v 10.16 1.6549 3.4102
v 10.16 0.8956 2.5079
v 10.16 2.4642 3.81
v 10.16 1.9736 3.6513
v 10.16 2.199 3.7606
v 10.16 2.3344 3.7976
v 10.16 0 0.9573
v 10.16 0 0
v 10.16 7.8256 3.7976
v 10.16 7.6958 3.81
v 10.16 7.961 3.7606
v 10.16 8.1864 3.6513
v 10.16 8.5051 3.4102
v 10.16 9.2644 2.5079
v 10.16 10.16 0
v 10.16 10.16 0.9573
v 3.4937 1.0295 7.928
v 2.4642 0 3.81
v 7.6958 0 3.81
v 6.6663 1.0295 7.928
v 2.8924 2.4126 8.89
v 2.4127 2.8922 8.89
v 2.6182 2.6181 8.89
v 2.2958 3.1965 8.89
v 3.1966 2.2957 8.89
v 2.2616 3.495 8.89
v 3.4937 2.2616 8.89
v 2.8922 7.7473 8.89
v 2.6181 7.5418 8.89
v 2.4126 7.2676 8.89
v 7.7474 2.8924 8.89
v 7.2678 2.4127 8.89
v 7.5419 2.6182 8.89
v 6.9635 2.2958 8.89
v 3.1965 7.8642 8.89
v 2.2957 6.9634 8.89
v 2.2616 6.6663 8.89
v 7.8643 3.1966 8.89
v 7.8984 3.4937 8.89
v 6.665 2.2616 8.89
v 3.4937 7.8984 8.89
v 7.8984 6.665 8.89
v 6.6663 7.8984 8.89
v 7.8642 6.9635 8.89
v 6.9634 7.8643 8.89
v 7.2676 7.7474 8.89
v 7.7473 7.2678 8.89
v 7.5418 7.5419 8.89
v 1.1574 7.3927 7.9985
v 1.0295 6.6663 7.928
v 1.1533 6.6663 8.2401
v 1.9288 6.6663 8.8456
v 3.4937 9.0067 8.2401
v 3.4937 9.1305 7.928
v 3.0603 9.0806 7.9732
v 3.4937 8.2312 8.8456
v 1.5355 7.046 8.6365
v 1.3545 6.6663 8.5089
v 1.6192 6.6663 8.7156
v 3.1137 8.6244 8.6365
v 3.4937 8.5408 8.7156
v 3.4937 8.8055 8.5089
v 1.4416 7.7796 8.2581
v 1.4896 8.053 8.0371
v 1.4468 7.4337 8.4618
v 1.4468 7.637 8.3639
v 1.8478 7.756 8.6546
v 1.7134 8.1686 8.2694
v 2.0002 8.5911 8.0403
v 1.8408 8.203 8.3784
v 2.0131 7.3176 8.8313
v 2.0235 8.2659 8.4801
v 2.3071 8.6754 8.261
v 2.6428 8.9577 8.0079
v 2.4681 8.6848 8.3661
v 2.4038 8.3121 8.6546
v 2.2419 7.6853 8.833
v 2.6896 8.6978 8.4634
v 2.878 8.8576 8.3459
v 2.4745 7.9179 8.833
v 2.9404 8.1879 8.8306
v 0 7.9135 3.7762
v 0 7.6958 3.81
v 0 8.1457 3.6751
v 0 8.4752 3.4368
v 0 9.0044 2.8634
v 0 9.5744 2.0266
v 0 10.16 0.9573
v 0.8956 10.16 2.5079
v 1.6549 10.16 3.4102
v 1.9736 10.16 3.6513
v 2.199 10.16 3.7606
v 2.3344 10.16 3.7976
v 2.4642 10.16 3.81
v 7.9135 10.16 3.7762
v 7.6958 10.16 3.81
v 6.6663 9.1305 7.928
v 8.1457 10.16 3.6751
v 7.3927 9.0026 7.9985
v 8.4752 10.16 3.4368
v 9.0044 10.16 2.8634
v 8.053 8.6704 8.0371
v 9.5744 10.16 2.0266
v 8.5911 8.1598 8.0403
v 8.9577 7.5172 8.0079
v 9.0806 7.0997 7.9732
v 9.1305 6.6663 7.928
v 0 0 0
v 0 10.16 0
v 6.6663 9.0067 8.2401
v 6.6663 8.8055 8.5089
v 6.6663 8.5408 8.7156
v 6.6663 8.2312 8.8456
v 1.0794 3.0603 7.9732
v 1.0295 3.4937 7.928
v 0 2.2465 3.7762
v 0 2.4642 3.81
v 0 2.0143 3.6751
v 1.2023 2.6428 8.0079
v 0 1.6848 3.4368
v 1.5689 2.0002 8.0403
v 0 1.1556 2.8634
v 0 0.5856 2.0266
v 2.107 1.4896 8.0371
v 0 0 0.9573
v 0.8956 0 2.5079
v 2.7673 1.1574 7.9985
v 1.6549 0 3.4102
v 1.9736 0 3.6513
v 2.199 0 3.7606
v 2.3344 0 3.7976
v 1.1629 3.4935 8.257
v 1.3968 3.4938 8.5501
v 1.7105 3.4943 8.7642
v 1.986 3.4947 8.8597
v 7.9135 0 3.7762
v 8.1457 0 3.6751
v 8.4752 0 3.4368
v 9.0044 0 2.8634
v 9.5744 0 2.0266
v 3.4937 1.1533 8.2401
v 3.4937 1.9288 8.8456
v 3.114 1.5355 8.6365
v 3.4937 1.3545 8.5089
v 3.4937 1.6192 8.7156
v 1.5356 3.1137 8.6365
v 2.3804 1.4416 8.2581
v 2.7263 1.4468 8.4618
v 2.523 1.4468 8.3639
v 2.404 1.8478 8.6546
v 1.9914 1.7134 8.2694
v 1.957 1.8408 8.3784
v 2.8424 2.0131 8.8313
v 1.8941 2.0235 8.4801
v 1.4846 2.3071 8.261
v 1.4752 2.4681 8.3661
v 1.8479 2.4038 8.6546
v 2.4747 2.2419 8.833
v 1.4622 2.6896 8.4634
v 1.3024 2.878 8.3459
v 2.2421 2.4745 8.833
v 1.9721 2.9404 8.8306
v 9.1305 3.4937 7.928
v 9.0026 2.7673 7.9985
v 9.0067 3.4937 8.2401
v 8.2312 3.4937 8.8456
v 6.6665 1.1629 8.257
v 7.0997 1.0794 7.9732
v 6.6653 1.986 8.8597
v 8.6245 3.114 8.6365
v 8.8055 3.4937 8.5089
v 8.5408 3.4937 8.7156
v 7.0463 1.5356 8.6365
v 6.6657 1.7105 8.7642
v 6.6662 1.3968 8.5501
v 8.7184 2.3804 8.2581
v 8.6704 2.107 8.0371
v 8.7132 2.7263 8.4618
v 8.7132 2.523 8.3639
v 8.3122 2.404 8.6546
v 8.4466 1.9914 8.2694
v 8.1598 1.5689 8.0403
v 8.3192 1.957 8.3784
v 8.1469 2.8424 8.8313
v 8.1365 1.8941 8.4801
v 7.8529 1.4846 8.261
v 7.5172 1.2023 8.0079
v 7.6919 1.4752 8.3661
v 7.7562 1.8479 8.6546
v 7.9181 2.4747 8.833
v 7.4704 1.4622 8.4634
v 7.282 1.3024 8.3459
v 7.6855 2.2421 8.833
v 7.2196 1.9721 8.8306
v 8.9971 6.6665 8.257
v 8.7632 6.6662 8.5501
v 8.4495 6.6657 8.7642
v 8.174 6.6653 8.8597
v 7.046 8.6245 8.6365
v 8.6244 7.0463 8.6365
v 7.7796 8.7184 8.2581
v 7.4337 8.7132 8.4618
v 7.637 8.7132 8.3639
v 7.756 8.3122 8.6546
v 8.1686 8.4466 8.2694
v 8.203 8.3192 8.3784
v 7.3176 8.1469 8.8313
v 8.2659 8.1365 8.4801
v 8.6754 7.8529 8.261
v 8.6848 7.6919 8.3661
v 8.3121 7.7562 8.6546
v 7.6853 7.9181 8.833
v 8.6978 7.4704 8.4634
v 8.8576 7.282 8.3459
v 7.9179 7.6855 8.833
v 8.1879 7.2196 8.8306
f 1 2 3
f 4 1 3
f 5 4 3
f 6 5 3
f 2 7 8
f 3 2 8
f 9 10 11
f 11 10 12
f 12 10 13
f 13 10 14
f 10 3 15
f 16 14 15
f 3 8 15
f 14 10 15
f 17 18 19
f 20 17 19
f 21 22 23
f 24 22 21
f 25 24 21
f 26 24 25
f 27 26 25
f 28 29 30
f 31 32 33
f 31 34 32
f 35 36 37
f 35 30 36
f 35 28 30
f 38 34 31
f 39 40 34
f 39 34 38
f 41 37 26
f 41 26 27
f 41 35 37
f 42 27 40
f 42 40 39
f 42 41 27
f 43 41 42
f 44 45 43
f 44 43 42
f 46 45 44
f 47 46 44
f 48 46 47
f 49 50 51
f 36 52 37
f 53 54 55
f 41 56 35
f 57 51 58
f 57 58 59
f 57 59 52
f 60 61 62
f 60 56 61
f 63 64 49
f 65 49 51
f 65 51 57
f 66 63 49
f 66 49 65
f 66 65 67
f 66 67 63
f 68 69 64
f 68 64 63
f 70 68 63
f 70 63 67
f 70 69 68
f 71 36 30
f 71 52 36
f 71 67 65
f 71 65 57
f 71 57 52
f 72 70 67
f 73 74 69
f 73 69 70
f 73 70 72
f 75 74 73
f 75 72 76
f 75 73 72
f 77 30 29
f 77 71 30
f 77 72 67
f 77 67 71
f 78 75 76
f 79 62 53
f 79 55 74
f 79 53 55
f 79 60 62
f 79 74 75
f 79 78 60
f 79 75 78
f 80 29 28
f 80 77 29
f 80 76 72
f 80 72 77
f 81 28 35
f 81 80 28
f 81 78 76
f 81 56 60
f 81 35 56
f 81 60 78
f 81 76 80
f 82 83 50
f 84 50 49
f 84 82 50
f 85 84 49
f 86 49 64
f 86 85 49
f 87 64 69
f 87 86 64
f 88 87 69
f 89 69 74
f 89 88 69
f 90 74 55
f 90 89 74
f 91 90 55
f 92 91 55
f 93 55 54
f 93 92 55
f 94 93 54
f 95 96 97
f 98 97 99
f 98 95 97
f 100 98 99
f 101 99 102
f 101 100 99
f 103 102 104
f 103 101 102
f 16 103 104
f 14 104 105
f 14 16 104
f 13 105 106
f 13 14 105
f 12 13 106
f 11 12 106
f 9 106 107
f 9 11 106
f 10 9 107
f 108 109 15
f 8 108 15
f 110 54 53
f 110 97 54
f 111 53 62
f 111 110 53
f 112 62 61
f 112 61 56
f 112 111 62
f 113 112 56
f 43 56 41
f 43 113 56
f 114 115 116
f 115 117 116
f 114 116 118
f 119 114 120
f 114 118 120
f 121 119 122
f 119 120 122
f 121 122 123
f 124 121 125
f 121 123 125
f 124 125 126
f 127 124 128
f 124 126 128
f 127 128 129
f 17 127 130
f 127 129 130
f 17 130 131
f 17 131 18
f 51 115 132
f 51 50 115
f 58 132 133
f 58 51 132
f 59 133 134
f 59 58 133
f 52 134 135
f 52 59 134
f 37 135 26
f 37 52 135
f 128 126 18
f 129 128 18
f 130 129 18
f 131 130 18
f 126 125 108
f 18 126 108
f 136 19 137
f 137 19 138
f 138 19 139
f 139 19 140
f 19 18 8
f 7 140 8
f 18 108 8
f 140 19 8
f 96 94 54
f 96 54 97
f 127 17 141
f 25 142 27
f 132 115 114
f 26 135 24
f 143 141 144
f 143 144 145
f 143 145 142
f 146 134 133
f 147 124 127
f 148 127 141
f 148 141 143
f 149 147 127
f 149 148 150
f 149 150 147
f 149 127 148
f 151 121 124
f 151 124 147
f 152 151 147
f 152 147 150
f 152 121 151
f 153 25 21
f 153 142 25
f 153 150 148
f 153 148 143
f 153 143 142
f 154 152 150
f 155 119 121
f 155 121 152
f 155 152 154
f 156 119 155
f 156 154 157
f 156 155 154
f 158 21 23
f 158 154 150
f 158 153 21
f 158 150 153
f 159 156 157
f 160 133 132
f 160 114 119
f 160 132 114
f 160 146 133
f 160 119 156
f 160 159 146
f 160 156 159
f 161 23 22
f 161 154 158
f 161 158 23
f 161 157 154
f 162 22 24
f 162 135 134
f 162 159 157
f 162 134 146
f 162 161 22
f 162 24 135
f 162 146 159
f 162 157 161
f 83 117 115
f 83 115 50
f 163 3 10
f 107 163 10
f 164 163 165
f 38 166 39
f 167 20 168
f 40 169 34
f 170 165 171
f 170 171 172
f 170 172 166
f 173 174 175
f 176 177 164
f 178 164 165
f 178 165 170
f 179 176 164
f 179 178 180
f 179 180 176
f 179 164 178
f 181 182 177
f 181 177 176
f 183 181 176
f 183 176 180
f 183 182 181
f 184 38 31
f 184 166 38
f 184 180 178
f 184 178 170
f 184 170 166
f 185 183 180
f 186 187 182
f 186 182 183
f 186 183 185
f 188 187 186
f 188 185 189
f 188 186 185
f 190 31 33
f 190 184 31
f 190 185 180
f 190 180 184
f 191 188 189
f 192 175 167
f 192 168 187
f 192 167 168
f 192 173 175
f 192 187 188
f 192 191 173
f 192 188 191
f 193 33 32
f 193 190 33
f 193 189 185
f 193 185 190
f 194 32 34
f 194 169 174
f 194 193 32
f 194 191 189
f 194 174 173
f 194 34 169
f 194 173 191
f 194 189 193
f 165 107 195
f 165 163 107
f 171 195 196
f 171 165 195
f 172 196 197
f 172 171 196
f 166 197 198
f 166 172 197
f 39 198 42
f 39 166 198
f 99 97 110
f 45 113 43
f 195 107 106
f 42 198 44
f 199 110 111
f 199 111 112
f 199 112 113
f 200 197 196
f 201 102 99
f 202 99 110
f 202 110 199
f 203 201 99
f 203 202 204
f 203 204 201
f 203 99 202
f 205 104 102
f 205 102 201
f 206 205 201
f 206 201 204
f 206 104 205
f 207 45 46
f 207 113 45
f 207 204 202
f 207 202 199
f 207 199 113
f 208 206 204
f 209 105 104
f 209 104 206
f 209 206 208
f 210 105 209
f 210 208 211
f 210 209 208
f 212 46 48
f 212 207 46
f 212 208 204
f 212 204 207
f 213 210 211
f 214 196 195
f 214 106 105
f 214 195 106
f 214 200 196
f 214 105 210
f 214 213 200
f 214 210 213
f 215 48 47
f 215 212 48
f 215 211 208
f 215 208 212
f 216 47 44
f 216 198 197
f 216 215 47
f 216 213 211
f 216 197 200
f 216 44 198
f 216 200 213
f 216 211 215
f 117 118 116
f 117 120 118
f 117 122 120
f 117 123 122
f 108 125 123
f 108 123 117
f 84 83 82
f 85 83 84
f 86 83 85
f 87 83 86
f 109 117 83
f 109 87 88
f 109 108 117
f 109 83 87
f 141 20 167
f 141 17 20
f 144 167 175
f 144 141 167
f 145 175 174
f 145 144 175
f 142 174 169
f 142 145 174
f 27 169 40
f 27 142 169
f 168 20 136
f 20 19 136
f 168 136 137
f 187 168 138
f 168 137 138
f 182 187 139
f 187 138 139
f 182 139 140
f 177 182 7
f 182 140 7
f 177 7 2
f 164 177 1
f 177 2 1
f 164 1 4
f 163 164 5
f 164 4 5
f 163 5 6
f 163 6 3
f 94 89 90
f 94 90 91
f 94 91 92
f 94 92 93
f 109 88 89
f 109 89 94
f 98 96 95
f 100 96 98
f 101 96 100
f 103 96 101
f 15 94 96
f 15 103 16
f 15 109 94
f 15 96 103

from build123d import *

# Parameters (mm, degrees)
F0_W     = 10.16
F0_H     = 10.16
F1_DEPTH = 8.89
F2_SIZE2 = 5.08
F2_SIZE  = 1.27
F3_R     = 2.54
F4_R     = 1.27


with BuildPart() as f1:
    # F0 (on Top) → F1 (new body)
    with BuildSketch(Plane.XY):
        with Locations((5.08, 5.08)):
            Rectangle(F0_W, F0_H)
    extrude(amount=F1_DEPTH)

    # F2
    f2_edges = [f1.edges().sort_by_distance(p)[0] for p in [
        (10.16, 5.08, 8.89),
        (5.08, 0, 8.89),
        (0, 5.08, 8.89),
        (5.08, 10.16, 8.89),
    ]]
    f2_side = f1.faces().sort_by_distance((5.08, 5.08, 8.89))[0]
    chamfer(f2_edges, length=F2_SIZE, length2=F2_SIZE2, reference=f2_side)

    # F3
    f3_edges = [f1.edges().sort_by_distance(p)[0] for p in [
        (9.525, 0.635, 6.35),
        (9.525, 9.525, 6.35),
        (0.635, 9.525, 6.35),
        (0.635, 0.635, 6.35),
    ]]
    fillet(f3_edges, radius=F3_R)

    # F4
    f4_edges = [f1.edges().sort_by_distance(p)[0] for p in [
        (1.983172, 8.176828, 8.89),
    ]]
    fillet(f4_edges, radius=F4_R)


solid = f1.part
